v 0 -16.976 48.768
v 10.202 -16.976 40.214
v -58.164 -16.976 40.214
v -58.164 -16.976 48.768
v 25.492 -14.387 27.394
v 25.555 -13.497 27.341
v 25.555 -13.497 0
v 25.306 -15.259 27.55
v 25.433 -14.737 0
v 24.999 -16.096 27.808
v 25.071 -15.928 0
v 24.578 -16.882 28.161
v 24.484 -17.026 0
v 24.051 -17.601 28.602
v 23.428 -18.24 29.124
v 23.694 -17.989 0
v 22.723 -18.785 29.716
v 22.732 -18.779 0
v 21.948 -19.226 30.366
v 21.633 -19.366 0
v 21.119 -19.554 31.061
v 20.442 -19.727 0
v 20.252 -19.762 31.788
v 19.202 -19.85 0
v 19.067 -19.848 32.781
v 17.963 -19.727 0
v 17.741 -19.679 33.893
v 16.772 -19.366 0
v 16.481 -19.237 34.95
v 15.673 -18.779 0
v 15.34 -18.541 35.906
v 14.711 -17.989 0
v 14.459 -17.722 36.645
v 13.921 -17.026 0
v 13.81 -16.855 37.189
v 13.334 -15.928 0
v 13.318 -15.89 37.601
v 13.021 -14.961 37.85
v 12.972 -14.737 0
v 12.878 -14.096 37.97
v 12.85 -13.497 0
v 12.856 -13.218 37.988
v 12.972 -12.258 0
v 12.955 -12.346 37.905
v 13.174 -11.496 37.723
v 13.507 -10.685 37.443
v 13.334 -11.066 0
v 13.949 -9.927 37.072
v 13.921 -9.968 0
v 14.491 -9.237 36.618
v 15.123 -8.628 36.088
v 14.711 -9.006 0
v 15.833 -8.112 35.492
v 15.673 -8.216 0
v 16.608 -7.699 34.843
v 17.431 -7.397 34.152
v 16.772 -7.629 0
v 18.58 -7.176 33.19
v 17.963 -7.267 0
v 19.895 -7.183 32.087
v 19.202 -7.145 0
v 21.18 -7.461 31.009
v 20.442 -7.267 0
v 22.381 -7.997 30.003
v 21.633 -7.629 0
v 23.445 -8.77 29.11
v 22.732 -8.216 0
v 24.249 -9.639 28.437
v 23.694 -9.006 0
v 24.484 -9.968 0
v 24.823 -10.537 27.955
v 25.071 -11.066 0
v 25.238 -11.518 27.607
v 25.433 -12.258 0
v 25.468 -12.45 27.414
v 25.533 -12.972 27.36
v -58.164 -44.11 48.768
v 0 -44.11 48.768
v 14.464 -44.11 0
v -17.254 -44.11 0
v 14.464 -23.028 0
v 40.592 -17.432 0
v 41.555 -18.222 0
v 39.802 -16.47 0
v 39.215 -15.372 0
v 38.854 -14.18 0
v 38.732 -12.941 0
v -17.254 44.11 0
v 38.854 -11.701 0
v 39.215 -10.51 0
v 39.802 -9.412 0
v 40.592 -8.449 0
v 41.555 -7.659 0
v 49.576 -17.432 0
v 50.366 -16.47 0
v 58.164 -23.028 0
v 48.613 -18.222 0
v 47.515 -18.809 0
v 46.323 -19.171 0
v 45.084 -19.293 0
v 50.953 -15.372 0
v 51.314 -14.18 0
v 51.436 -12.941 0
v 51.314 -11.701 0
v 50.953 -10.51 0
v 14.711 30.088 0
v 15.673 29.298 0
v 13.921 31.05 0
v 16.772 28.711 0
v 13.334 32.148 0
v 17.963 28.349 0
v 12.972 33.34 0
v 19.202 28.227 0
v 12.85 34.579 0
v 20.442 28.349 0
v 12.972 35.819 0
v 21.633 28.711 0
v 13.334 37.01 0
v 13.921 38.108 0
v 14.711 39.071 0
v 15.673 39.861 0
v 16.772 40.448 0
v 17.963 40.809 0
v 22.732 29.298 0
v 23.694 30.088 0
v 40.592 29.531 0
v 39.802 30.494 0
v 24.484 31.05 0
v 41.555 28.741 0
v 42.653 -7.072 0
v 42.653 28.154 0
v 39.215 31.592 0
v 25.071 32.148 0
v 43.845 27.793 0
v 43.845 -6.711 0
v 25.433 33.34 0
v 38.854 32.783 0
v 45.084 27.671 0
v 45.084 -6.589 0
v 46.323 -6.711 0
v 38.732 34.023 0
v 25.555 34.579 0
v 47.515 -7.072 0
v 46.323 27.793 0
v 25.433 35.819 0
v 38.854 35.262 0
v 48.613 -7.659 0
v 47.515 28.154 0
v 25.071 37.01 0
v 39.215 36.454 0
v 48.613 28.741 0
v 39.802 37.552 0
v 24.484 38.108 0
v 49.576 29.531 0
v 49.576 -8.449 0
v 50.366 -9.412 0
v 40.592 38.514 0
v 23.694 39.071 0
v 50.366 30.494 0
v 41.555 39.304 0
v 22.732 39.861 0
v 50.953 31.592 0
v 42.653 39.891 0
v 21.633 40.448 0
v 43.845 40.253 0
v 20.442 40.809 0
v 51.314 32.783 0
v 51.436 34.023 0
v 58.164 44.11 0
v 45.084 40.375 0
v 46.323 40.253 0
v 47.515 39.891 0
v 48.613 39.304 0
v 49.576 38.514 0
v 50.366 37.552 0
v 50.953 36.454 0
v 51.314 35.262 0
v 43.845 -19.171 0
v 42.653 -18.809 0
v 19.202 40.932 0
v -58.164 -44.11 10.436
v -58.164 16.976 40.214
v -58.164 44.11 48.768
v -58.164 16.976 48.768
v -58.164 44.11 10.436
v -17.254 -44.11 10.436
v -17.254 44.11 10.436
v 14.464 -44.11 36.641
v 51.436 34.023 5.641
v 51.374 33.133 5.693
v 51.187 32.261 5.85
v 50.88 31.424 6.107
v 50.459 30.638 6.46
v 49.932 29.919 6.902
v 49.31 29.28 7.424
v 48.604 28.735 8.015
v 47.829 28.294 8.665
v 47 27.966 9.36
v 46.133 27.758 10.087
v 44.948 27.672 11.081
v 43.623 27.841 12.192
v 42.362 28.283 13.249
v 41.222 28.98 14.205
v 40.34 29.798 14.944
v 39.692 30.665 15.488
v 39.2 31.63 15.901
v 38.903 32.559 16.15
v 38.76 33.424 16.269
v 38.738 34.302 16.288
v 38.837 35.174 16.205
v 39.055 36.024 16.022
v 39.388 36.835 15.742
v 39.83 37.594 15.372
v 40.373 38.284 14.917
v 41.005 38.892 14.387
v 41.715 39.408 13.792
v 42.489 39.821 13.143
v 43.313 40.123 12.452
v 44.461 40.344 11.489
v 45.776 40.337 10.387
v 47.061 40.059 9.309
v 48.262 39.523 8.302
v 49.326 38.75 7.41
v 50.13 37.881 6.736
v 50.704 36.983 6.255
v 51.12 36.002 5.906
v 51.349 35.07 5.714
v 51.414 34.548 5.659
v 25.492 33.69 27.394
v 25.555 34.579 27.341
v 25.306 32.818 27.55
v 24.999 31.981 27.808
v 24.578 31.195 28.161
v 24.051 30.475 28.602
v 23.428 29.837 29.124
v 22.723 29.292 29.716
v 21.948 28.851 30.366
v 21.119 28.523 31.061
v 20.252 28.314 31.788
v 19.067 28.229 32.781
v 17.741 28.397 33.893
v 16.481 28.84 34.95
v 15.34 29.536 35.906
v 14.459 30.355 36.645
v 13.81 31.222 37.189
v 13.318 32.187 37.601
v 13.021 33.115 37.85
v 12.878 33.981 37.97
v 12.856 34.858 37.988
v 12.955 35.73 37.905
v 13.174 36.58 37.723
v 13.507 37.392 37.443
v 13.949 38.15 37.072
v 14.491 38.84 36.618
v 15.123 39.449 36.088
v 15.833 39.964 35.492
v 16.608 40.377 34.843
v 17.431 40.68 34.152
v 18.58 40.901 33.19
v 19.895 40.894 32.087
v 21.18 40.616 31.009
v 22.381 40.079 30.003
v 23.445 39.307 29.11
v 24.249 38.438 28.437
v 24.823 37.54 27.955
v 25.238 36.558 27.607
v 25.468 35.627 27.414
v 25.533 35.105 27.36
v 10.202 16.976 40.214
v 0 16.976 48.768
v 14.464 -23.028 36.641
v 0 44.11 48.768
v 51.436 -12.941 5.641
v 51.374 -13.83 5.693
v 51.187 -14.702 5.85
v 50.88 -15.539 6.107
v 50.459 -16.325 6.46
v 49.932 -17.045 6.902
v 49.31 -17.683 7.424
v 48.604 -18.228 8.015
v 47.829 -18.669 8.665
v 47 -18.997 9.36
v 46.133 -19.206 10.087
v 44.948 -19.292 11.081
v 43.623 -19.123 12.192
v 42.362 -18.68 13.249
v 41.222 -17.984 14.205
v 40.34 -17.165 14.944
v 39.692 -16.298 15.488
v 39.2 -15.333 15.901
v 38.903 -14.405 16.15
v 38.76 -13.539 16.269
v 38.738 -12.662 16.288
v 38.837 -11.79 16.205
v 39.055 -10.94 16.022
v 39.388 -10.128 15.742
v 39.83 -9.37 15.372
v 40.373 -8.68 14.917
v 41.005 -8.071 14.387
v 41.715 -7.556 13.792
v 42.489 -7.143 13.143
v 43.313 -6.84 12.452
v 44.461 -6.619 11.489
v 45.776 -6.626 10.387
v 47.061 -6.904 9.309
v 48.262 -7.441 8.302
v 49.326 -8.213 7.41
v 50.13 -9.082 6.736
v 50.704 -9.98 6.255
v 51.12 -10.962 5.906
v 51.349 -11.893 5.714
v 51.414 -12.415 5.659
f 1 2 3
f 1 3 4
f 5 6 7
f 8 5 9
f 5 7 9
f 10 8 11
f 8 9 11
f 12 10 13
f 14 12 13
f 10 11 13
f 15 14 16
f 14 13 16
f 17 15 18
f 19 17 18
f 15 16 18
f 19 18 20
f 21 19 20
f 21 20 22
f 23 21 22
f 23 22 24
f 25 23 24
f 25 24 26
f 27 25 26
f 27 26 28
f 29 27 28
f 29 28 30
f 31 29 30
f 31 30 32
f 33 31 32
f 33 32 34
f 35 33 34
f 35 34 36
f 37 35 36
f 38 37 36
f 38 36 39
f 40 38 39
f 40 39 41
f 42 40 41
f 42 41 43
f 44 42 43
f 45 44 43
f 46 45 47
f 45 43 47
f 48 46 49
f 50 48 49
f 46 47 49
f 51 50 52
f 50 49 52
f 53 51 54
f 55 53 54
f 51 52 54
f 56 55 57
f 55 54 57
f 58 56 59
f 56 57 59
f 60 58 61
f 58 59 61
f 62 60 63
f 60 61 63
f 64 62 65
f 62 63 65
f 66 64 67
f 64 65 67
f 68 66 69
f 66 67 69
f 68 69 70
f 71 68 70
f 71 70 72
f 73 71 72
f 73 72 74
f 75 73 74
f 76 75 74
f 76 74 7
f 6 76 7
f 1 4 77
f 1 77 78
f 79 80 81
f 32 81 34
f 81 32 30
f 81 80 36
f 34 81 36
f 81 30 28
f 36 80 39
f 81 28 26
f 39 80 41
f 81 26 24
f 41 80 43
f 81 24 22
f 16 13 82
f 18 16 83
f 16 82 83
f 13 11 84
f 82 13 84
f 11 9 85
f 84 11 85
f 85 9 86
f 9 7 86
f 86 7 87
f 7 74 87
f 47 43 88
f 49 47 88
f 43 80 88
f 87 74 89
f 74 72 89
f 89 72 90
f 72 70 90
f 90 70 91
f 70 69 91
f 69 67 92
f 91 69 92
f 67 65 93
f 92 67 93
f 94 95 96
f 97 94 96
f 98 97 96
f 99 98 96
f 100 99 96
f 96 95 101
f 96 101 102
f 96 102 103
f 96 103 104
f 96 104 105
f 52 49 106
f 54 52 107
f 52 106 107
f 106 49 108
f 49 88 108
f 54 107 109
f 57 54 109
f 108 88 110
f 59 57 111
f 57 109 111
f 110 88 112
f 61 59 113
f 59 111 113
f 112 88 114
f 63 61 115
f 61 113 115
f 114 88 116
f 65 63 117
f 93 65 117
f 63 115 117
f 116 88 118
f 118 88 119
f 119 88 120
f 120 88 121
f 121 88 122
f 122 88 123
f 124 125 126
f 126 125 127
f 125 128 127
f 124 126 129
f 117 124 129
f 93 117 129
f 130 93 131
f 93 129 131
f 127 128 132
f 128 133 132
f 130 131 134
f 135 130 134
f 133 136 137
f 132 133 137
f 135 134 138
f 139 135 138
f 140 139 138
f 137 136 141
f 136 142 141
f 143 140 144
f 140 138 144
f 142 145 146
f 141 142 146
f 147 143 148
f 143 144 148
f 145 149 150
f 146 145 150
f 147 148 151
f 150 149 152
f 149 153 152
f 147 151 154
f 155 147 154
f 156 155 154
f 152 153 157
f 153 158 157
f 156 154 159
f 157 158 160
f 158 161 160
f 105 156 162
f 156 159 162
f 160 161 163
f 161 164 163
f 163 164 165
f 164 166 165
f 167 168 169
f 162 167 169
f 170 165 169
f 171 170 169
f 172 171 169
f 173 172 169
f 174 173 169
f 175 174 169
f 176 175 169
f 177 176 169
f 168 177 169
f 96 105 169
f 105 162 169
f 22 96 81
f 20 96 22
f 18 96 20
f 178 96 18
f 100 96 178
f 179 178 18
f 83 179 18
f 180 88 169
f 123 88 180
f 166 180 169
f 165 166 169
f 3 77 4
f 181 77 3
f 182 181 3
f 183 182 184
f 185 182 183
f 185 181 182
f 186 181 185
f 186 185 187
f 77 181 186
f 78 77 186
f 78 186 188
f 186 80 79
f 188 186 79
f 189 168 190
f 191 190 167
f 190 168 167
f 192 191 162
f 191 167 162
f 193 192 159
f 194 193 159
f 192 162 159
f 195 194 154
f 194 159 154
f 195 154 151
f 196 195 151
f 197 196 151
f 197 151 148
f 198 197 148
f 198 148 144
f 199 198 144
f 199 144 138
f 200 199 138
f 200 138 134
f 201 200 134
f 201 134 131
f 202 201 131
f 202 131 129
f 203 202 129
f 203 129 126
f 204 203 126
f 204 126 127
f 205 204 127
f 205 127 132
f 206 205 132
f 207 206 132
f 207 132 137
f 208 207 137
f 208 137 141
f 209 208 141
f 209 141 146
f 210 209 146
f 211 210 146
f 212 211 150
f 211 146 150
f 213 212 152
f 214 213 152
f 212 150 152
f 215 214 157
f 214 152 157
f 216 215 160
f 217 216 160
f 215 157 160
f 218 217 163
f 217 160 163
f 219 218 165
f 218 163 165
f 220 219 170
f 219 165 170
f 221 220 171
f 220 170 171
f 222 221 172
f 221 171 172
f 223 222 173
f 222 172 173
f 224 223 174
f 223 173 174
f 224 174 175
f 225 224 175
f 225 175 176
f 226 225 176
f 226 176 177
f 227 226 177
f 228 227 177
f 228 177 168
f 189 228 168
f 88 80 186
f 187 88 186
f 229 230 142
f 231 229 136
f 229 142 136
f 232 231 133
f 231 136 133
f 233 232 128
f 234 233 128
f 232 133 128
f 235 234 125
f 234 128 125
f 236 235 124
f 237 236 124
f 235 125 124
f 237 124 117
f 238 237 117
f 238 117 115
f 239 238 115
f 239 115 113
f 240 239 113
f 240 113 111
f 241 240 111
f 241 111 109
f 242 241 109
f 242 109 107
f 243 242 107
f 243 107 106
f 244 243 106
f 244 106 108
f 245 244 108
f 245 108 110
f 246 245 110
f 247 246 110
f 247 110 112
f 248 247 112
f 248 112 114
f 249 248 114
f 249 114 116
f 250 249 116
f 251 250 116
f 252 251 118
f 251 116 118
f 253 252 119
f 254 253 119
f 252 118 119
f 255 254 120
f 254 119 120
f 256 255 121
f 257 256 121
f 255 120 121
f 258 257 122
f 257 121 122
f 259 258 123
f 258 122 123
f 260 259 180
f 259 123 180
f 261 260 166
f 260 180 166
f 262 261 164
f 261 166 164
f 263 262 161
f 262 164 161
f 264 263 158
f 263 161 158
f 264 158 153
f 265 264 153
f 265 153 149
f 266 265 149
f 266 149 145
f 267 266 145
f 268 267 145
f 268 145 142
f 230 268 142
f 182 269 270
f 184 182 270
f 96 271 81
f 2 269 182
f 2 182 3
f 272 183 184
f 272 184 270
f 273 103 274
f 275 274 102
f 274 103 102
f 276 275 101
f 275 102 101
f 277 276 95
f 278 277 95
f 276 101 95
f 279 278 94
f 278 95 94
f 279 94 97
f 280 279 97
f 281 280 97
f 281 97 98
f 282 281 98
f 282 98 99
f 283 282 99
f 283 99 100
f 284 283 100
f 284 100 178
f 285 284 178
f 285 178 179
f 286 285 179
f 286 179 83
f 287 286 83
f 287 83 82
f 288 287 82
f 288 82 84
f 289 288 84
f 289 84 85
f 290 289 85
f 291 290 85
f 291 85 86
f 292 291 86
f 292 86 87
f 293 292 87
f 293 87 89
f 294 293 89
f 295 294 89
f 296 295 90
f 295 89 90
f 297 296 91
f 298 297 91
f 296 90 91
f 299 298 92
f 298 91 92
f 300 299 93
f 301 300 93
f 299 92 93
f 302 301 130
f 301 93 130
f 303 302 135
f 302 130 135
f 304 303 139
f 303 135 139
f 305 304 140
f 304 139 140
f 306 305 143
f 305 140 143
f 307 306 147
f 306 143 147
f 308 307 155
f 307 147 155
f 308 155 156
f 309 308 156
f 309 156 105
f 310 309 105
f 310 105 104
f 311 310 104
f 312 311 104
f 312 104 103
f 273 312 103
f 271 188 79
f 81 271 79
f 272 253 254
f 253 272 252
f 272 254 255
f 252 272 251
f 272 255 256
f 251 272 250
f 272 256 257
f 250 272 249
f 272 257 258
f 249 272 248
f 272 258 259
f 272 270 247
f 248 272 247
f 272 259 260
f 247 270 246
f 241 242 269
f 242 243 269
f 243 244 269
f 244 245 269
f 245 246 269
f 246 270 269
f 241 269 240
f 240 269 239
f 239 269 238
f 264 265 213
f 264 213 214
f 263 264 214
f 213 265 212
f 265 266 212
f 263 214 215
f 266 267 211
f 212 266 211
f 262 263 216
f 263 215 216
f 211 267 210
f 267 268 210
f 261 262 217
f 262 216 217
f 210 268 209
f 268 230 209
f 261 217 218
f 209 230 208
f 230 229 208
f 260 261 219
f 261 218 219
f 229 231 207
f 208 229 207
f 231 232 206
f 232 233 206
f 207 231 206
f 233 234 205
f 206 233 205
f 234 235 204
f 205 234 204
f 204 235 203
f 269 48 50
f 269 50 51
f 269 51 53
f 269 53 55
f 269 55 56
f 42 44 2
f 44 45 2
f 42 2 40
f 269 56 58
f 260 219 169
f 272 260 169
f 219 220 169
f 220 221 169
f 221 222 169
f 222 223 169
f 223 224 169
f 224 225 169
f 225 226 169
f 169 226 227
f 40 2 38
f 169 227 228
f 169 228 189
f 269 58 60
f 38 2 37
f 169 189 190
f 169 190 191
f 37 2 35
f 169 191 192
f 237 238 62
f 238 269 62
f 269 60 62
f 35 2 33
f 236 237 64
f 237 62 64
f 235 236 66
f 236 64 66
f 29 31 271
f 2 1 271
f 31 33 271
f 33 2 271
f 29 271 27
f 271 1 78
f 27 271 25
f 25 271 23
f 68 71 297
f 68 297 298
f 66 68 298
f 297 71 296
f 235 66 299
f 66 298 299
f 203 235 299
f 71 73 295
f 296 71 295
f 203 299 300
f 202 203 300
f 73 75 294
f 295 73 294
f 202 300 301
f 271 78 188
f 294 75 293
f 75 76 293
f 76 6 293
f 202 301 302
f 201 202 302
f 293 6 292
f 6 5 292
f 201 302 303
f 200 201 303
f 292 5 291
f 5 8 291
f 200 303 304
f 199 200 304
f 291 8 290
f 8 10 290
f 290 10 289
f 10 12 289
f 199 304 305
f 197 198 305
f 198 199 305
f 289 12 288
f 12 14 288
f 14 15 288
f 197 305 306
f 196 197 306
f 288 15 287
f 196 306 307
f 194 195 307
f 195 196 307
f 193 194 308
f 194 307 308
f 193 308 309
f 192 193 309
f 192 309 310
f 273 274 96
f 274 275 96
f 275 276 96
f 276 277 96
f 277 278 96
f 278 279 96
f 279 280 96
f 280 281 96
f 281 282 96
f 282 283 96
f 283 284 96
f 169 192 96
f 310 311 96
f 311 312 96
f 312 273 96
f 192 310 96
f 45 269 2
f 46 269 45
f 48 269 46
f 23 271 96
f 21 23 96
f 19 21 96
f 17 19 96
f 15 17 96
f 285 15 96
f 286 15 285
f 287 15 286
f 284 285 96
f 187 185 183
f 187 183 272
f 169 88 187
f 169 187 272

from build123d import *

# Parameters (mm, degrees)
F0_W      = 116.327592
F0_H      = 88.219724
F1_DEPTH  = 48.768
F3_DEPTH  = 93.218
F5_DEPTH  = 21.082
F6_W      = 40.909464
F6_H      = 10.436087
F7_DEPTH  = 91.694
F8_W      = 33.952072
F8_H      = 17.108554
F9_DEPTH  = 78.486
F10_R     = 6.352216
F11_DEPTH = 58.928


with BuildPart() as f1:
    # F0 (on Top) → F1 (new body)
    with BuildSketch(Plane.XY):
        Rectangle(F0_W, F0_H)
    extrude(amount=F1_DEPTH)

    # F2 (on face) → F3 (cut)
    with BuildSketch(Plane.XZ.offset(44.109862)):
        Polygon((58.163796, 0), (58.163796, 48.768), (0, 48.768), align=None)
    extrude(amount=-F3_DEPTH, mode=Mode.SUBTRACT)

    # F4 (on face) → F5 (cut)
    with BuildSketch(Plane.XZ.offset(44.109862)):
        Polygon((58.163796, 0), (14.46391, 36.640594), (14.46391, 0), align=None)
    extrude(amount=-F5_DEPTH, mode=Mode.SUBTRACT)

    # F6 (on face) → F7 (cut)
    with BuildSketch(Plane.XZ.offset(44.109862)):
        with Locations((-37.709064, 5.218043)):
            Rectangle(F6_W, F6_H)
    extrude(amount=-F7_DEPTH, mode=Mode.SUBTRACT)

    # F8 (on face) → F9 (cut)
    with BuildSketch(Plane(origin=(-58.163796, 0, 0), x_dir=(0, -1, 0), z_dir=(-1, 0, 0))):
        with Locations((0, 48.768)):
            Rectangle(F8_W, F8_H)
    extrude(amount=-F9_DEPTH, mode=Mode.SUBTRACT)

    # F10 (on face) → F11 (cut)
    with BuildSketch(Plane(origin=(0, 0, 0), x_dir=(1, 0, 0), z_dir=(0, 0, -1))):
        with Locations((45.083895, 12.940748)):
            Circle(F10_R)
        with Locations((19.2024, 13.49734)):
            Circle(F10_R)
        with Locations((45.083895, -34.022748)):
            Circle(F10_R)
        with Locations((19.2024, -34.57934)):
            Circle(F10_R)
    extrude(amount=-F11_DEPTH, mode=Mode.SUBTRACT)


solid = f1.part
